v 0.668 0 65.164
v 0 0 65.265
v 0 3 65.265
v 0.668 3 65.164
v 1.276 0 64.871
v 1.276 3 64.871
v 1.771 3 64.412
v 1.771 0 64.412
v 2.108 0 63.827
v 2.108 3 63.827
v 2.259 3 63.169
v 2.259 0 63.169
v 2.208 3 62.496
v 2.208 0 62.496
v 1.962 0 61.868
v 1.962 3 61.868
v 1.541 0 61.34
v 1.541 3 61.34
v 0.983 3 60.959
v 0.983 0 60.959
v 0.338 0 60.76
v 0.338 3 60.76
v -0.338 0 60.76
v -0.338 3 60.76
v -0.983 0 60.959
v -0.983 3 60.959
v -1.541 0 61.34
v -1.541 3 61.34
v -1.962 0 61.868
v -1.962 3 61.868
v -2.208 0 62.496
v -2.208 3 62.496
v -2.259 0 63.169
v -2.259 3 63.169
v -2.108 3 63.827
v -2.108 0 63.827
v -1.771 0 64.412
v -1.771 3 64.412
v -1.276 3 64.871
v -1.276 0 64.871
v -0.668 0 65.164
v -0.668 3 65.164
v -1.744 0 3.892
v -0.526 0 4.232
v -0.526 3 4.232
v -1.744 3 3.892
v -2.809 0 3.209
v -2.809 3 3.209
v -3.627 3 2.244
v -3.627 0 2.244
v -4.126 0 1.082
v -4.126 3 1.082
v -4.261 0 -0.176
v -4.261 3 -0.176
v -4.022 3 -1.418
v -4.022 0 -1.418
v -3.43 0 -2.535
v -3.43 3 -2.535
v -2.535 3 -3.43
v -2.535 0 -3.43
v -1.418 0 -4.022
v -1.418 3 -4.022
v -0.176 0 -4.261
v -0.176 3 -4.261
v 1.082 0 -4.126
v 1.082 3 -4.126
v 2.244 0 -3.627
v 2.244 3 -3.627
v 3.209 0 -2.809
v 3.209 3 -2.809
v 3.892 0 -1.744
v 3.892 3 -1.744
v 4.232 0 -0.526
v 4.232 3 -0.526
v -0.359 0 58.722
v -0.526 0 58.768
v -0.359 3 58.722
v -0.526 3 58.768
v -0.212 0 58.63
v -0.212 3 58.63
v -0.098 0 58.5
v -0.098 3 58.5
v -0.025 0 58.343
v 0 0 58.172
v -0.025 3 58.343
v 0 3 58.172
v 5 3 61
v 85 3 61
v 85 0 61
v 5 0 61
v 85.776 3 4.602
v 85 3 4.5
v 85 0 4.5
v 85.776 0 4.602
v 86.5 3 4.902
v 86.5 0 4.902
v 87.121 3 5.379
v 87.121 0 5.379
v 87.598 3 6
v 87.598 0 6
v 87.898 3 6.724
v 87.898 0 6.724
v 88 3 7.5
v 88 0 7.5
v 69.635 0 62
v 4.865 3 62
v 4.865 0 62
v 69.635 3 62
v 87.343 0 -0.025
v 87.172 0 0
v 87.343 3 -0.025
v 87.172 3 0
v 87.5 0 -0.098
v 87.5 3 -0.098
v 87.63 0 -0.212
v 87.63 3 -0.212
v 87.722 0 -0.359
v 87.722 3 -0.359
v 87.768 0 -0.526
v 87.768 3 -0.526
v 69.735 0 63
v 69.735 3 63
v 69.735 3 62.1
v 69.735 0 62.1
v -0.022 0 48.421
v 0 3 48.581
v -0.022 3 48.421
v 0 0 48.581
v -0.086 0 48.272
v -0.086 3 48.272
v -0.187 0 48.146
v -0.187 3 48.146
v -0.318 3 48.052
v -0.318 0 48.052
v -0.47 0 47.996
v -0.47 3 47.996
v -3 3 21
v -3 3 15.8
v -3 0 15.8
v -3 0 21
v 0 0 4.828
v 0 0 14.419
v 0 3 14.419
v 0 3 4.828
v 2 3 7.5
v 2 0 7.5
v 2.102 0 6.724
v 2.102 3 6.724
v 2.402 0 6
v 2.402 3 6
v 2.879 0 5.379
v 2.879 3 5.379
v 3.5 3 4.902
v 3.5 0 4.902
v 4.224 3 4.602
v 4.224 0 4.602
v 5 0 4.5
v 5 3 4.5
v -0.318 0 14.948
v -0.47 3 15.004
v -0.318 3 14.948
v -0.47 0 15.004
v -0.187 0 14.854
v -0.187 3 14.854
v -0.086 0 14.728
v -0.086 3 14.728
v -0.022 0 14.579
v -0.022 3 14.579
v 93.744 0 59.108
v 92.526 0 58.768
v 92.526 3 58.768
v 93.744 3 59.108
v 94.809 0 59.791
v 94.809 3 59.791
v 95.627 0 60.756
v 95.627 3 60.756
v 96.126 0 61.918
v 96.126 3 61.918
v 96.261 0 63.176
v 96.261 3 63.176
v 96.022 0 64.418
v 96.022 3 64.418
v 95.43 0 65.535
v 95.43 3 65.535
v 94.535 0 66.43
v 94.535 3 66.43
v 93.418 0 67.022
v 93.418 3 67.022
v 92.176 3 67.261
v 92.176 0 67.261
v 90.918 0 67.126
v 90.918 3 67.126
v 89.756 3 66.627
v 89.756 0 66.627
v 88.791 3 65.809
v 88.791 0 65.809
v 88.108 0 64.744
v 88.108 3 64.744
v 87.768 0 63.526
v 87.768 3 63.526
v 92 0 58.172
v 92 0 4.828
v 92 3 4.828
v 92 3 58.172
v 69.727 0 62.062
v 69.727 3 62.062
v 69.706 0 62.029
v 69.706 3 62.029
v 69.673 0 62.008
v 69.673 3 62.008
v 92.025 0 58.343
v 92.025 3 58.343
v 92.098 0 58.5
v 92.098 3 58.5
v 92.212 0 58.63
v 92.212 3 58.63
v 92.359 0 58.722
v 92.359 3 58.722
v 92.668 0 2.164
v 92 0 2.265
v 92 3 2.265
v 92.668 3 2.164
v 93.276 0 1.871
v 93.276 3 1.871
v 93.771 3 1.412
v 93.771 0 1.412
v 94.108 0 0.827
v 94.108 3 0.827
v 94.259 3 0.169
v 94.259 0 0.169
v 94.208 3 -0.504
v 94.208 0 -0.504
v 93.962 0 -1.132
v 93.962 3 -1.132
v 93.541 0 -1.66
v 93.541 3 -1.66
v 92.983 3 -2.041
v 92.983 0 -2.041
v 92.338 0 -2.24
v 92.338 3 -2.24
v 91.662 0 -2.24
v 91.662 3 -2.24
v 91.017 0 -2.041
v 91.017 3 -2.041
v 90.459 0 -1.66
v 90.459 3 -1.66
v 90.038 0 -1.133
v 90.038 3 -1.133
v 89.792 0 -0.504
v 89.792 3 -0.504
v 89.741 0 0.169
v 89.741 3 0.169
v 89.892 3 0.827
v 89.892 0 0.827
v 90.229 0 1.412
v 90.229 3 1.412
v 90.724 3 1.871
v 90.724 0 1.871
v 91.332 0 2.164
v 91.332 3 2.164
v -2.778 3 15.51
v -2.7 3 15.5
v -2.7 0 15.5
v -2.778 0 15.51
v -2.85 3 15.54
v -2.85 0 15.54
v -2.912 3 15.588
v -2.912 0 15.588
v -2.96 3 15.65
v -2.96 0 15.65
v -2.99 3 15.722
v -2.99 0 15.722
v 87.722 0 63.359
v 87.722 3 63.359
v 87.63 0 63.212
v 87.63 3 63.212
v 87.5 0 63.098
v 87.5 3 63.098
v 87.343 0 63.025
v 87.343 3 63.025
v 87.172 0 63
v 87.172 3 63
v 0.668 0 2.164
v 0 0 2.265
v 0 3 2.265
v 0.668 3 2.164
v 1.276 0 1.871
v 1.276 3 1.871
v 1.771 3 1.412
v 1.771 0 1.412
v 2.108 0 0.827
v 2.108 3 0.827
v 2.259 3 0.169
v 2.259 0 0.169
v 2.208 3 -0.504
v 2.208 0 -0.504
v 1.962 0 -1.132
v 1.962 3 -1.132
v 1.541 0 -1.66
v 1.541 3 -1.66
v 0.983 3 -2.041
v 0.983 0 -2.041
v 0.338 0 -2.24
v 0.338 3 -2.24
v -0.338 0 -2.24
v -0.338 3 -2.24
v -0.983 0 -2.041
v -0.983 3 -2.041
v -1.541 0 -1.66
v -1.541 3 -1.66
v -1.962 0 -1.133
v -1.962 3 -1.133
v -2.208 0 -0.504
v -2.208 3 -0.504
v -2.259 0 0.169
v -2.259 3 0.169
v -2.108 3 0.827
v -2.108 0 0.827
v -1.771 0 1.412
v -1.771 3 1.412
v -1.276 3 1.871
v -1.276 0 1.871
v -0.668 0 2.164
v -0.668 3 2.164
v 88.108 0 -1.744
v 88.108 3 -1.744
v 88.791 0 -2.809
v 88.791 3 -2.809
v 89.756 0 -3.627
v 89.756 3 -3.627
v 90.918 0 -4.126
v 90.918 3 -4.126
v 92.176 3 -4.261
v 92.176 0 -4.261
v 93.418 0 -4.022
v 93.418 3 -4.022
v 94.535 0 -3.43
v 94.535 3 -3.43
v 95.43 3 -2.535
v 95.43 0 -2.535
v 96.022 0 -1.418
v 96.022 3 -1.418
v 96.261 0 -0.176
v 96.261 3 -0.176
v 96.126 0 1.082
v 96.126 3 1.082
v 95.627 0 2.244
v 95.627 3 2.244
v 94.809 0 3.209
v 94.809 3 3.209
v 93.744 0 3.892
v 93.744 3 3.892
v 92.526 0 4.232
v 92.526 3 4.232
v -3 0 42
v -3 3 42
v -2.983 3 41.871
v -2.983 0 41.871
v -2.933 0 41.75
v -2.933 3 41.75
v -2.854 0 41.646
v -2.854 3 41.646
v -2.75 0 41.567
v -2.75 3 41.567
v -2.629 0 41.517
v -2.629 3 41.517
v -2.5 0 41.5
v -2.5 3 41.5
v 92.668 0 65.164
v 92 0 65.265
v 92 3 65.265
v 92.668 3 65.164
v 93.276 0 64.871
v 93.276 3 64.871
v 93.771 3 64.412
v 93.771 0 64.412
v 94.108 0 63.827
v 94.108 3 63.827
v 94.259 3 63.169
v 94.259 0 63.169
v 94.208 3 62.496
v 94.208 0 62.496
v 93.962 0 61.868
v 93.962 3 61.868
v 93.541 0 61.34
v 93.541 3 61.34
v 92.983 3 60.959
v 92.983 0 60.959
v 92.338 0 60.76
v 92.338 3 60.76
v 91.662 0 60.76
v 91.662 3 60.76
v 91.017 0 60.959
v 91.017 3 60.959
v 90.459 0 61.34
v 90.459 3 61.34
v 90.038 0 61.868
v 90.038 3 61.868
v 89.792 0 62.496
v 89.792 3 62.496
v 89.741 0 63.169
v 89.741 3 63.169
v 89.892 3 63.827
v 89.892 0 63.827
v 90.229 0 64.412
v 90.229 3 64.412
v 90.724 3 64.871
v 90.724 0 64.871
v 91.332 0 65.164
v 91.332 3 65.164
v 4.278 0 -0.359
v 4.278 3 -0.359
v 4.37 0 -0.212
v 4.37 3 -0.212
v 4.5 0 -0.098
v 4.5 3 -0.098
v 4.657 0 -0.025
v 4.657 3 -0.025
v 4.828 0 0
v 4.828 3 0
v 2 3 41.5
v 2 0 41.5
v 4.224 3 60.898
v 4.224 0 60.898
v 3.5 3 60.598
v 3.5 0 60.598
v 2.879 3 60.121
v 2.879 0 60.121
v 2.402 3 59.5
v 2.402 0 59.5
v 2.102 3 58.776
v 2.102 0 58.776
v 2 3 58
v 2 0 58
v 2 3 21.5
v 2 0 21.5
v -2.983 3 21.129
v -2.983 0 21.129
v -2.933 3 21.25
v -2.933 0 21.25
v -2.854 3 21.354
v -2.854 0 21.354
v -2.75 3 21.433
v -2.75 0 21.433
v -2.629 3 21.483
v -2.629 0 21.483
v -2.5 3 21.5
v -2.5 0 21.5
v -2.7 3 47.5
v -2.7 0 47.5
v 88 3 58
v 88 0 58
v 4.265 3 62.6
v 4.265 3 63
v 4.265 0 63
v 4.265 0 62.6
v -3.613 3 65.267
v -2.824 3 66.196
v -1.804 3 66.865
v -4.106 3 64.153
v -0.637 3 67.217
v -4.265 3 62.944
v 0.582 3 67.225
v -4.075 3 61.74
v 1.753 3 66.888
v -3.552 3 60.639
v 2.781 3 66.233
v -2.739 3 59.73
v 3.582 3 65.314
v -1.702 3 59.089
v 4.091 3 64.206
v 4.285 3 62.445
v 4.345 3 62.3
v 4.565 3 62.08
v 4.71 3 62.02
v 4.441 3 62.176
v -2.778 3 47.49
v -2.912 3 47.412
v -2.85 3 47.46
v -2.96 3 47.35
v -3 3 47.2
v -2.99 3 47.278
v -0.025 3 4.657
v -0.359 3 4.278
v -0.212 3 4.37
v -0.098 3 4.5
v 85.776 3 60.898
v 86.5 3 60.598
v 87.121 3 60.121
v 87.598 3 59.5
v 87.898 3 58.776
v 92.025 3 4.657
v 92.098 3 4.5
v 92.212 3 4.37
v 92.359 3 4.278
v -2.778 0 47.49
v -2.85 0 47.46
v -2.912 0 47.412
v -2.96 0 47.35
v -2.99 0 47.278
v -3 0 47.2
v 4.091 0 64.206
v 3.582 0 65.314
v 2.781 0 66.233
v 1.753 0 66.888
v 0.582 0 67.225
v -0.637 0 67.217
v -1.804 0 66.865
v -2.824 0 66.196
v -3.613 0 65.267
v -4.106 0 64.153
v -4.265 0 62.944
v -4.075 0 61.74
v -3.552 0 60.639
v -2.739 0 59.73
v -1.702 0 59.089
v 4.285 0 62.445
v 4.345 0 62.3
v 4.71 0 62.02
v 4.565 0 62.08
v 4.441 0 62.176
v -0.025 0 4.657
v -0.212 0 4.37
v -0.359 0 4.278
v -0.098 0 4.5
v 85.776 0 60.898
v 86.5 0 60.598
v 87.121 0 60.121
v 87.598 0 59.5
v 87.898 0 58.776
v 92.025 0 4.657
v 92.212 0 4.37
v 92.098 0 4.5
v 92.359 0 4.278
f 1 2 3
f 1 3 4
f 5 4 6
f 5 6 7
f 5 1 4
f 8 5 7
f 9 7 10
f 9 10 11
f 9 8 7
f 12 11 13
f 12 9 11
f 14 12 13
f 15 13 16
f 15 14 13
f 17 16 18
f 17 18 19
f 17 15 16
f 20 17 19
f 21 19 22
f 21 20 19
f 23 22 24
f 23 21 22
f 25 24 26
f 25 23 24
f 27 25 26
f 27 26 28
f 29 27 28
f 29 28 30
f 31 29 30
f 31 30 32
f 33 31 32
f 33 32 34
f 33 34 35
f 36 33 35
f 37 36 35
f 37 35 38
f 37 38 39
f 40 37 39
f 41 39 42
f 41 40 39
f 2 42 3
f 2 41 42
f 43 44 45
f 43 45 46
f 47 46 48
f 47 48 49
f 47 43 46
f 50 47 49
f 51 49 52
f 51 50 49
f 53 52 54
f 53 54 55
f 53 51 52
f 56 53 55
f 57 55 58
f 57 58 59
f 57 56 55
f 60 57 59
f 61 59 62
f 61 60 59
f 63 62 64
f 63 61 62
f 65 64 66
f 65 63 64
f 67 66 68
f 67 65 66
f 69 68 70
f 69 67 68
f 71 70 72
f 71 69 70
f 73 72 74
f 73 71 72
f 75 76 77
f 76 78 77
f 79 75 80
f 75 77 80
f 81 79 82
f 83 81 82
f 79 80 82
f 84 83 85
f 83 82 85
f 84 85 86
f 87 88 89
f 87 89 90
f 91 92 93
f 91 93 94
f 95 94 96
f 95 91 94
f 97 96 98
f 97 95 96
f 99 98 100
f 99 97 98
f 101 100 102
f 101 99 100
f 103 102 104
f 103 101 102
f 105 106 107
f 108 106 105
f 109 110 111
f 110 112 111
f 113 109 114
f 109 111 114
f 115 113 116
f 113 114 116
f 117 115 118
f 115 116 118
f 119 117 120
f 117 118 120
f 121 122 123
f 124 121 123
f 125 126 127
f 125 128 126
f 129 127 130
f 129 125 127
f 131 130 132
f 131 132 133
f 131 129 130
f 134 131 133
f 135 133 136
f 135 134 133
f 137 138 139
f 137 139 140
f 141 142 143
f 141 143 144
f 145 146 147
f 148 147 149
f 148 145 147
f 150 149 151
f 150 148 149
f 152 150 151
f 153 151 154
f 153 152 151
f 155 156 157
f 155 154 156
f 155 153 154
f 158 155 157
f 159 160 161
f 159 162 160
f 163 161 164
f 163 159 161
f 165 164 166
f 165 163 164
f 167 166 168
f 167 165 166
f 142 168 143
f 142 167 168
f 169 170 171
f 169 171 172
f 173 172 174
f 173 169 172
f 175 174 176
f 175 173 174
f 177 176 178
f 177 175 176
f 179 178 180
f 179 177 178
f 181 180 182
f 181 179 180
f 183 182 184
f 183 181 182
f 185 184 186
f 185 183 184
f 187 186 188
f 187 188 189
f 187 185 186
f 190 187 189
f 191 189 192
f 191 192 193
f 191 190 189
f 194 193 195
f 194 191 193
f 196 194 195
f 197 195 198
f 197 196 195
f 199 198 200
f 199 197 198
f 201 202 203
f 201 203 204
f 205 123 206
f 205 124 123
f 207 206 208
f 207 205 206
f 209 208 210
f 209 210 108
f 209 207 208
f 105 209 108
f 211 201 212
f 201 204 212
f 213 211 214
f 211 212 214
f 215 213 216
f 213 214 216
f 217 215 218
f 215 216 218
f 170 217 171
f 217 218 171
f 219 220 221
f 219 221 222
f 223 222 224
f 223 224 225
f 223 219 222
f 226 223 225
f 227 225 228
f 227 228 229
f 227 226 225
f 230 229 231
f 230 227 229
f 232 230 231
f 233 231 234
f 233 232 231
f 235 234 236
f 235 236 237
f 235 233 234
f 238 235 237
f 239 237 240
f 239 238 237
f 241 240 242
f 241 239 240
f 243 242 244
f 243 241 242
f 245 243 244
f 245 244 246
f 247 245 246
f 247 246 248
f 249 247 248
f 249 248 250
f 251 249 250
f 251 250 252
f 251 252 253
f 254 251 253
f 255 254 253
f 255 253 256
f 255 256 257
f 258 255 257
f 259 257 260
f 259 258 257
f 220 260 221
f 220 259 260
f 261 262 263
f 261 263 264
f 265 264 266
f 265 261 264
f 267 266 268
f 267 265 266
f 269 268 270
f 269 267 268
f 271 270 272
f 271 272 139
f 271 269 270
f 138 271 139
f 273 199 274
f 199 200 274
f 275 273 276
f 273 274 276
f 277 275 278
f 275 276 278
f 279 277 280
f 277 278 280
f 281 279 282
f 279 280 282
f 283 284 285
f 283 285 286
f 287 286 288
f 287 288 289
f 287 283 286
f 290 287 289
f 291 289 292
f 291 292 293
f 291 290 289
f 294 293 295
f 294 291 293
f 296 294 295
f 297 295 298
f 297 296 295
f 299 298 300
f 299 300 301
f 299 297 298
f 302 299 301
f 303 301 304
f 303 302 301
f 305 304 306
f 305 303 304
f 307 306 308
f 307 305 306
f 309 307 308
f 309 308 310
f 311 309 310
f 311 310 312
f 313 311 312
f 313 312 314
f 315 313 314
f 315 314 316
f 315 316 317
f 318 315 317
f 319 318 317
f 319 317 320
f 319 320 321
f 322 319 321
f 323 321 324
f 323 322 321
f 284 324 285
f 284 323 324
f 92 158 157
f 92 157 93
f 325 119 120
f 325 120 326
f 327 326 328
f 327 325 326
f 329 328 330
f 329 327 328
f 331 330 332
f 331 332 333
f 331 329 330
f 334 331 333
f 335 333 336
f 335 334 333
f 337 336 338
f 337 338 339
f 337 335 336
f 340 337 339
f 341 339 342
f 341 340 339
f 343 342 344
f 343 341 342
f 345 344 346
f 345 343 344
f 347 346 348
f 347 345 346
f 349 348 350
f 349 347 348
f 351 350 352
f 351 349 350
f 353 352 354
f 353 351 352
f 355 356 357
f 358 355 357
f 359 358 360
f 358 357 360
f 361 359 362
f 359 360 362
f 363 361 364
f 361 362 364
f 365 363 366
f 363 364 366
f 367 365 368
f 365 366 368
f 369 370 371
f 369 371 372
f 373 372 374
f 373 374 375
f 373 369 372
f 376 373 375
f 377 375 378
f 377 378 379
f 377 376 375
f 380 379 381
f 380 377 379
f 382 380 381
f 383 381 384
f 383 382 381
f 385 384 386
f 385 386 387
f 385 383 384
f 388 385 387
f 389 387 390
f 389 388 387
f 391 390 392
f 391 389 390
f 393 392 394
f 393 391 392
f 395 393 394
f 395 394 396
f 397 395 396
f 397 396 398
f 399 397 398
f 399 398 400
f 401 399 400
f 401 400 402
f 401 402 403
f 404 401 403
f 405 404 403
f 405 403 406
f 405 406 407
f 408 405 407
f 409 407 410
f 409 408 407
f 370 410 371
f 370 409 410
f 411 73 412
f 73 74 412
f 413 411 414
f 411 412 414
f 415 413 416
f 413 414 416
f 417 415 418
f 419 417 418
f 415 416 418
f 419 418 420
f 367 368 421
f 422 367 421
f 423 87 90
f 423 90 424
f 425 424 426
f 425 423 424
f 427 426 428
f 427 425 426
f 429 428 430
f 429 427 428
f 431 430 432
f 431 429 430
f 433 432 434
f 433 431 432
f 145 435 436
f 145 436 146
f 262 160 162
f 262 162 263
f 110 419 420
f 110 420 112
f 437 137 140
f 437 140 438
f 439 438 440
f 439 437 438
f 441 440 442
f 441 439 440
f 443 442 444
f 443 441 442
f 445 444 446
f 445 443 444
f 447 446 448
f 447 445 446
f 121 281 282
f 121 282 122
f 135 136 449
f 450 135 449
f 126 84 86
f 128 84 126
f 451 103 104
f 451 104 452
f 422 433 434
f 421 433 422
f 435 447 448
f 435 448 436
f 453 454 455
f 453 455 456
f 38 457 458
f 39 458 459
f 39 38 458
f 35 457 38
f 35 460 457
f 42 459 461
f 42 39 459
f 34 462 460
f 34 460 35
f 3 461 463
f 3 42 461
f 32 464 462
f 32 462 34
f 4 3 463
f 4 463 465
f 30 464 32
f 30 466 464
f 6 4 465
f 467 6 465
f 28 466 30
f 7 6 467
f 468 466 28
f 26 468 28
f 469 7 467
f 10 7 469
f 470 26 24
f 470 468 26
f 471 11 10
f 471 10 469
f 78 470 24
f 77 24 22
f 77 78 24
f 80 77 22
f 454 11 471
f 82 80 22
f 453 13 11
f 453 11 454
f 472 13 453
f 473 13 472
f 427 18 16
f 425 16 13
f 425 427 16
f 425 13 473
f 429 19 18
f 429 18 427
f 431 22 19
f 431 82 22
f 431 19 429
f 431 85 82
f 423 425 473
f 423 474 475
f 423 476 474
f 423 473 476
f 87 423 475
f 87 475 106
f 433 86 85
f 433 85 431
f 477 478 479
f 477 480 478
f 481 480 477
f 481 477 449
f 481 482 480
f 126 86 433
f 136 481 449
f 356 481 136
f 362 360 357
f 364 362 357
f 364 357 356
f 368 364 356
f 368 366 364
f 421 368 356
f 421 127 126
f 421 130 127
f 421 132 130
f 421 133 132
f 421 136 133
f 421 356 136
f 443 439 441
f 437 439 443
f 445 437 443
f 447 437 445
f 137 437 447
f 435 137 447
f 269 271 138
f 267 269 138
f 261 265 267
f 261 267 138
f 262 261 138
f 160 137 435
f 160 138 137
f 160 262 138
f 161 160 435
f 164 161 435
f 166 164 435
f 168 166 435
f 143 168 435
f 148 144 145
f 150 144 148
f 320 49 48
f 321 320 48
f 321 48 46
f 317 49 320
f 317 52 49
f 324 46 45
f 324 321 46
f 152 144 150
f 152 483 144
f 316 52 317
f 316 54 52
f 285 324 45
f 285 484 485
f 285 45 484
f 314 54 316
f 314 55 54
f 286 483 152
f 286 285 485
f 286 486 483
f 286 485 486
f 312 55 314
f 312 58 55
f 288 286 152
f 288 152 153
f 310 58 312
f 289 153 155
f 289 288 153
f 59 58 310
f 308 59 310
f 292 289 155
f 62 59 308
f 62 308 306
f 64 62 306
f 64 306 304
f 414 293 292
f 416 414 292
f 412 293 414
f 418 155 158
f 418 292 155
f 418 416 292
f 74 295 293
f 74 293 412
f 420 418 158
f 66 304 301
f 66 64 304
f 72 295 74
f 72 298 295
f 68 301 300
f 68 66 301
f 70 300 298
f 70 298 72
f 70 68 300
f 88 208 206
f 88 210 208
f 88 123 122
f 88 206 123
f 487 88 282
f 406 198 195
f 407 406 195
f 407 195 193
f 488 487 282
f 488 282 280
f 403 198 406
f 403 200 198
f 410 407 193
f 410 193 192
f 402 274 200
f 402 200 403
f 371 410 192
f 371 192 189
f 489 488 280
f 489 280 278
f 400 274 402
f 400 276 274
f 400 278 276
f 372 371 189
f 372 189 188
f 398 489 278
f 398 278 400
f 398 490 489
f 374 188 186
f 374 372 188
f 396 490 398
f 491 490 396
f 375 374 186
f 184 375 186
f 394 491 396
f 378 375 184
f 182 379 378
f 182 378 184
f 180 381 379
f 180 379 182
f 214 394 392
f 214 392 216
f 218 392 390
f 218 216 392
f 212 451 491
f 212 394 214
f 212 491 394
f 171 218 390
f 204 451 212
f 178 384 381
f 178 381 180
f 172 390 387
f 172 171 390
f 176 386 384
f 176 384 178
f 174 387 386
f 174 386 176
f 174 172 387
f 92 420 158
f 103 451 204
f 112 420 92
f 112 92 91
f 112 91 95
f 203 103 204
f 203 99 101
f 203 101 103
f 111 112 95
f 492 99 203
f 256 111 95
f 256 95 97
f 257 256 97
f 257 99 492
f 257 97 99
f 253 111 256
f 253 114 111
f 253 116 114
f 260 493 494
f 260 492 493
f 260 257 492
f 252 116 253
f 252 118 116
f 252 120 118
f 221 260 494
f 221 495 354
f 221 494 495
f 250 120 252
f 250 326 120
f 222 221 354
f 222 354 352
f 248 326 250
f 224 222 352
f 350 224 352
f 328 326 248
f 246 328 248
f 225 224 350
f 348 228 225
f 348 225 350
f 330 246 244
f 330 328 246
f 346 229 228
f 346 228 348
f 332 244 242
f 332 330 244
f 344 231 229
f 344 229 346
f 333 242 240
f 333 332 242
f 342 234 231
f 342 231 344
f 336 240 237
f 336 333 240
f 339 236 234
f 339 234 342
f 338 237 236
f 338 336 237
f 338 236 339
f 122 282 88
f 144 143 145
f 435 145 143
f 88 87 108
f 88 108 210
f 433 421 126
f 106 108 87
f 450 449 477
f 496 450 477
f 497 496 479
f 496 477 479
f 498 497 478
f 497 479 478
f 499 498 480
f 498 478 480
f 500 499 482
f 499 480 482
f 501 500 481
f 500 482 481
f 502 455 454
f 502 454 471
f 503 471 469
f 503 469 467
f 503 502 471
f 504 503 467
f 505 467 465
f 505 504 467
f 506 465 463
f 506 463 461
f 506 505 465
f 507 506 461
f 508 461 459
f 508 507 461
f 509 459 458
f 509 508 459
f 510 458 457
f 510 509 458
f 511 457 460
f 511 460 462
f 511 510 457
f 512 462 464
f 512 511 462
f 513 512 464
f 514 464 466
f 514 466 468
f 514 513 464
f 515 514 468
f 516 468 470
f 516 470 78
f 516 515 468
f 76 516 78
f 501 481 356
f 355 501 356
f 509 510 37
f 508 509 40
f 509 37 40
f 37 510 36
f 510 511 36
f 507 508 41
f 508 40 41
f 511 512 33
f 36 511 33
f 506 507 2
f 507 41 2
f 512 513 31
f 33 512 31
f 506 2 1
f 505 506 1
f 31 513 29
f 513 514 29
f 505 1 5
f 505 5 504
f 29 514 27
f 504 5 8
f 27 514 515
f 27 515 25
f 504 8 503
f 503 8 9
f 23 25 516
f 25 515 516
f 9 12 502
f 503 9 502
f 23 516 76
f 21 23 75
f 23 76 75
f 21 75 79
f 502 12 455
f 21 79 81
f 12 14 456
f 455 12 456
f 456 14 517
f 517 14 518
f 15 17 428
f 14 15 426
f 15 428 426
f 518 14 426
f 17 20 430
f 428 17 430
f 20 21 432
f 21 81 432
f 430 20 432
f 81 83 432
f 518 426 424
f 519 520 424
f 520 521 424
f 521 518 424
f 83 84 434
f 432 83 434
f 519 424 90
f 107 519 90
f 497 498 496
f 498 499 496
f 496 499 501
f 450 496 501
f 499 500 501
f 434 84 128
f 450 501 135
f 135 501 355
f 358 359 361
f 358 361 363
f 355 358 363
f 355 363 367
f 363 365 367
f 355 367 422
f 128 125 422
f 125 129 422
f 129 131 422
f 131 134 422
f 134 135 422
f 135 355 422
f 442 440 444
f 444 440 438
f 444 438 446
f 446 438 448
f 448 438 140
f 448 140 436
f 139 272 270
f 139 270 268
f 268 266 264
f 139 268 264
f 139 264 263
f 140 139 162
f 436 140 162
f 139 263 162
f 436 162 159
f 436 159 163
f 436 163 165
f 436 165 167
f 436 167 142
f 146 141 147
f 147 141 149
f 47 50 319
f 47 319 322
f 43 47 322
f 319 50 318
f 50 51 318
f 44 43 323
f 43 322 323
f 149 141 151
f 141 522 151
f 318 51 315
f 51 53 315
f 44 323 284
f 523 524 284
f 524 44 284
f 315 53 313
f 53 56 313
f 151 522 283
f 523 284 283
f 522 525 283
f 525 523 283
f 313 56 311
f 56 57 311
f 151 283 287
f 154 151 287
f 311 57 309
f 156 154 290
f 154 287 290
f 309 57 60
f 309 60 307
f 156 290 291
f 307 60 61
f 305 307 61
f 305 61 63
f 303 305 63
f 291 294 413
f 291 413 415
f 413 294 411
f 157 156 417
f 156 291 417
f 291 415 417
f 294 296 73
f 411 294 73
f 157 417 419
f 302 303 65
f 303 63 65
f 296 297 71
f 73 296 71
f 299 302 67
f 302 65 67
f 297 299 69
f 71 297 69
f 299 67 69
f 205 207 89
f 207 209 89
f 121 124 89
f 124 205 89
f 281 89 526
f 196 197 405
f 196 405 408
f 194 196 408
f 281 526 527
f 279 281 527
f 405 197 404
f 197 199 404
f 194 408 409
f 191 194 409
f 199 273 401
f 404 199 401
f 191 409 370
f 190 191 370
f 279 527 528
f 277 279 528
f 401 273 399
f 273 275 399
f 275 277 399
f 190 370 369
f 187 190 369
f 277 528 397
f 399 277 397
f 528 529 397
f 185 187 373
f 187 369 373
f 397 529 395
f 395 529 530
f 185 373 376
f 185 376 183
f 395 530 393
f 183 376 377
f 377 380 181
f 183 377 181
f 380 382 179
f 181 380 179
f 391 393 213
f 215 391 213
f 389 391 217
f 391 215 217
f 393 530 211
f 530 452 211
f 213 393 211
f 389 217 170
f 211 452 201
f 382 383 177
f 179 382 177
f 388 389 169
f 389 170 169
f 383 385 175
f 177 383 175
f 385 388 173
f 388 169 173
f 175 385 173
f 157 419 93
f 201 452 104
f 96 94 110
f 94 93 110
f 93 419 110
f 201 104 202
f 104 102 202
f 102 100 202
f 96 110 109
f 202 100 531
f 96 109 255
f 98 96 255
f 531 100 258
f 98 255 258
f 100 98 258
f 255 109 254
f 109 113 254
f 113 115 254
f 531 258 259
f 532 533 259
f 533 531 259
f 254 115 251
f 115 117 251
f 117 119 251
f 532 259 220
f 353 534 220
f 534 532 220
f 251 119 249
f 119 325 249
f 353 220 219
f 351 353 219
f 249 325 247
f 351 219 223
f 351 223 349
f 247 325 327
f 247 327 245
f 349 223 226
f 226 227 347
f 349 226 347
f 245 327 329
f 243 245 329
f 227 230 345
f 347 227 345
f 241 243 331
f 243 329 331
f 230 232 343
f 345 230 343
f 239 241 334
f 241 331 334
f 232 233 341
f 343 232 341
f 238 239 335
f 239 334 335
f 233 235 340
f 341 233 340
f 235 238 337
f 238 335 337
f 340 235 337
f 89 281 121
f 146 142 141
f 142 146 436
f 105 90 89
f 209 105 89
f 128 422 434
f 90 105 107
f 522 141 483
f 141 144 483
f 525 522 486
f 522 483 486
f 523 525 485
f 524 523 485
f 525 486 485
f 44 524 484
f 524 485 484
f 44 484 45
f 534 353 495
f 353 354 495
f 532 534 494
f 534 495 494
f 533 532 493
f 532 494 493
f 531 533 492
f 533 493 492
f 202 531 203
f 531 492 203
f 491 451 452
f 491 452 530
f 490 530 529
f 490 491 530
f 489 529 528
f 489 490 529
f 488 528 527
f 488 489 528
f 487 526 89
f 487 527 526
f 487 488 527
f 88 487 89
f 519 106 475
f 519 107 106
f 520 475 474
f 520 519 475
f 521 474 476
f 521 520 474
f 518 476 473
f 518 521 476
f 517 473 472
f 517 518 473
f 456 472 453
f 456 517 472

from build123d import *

# Parameters (mm, degrees)
SKETCH1_R           = 2.265
BOSS_EXTRUDE1_DEPTH = 3
SKETCH2_W           = 6.5
SKETCH2_H           = 20
CUT_EXTRUDE1_DEPTH  = 3
BOSS_EXTRUDE2_DEPTH = 3
CUT_EXTRUDE5_DEPTH  = 17
SKETCH9_W           = 65.47
SKETCH9_H           = 1
CUT_EXTRUDE6_DEPTH  = 17
FILLET2_R           = 0.6
FILLET3_R           = 0.1


with BuildPart() as part:
    # Sketch1 → Boss-Extrude1 (new body)
    with BuildSketch(Plane(origin=(0, 0, 0), x_dir=(1, 0, 0), z_dir=(0, 1, 0))):
        with BuildLine():
            Line((4.265, 0), (87.735, 0))
            ThreePointArc((87.735, 0), (95.015810422, 3.015810422), (92, -4.265))
            Line((92, -4.265), (92, -58.735))
            ThreePointArc((92, -58.735), (95.015810422, -66.015810422), (87.735, -63))
            Line((87.735, -63), (4.265, -63))
            ThreePointArc((4.265, -63), (-3.015810422, -66.015810422), (0, -58.735))
            Line((0, -58.735), (0, -4.265))
            ThreePointArc((0, -4.265), (-3.015810422, 3.015810422), (4.265, 0))
        make_face()
        with Locations(Location((0, 0, 0), (0, 0, 270))):
            Circle(SKETCH1_R, mode=Mode.SUBTRACT)
        with Locations(Location((92, 0, 0), (0, 0, 270))):
            Circle(SKETCH1_R, mode=Mode.SUBTRACT)
        with Locations(Location((92, -63, 0), (0, 0, 270))):
            Circle(SKETCH1_R, mode=Mode.SUBTRACT)
        with Locations(Location((0, -63, 0), (0, 0, 270))):
            Circle(SKETCH1_R, mode=Mode.SUBTRACT)
    extrude(amount=BOSS_EXTRUDE1_DEPTH)

    # Sketch2 → Cut-Extrude1 (cut)
    with BuildSketch(Plane(origin=(0, 3, 0), x_dir=(1, 0, 0), z_dir=(0, 1, 0))):
        with Locations((3.25, -31.5)):
            Rectangle(SKETCH2_W, SKETCH2_H)
    extrude(amount=-CUT_EXTRUDE1_DEPTH, mode=Mode.SUBTRACT)

    # Sketch3 → Boss-Extrude2 (add)
    with BuildSketch(Plane(origin=(0, 3, 0), x_dir=(1, 0, 0), z_dir=(0, 1, 0))):
        with BuildLine():
            Line((0, -14.9), (-2.7, -15.5))
            ThreePointArc((-2.7, -15.5), (-2.912132034, -15.587867966), (-3, -15.8))
            Line((-3, -15.8), (-3, -21))
            ThreePointArc((-3, -21), (-2.853553391, -21.353553391), (-2.5, -21.5))
            Line((-2.5, -21.5), (0, -21.5))
            Line((0, -21.5), (0, -14.9))
        make_face()
        with BuildLine():
            Line((0, -41.5), (0, -48.1))
            Line((0, -48.1), (-2.7, -47.5))
            ThreePointArc((-2.7, -47.5), (-2.912132034, -47.412132034), (-3, -47.2))
            Line((-3, -47.2), (-3, -42))
            ThreePointArc((-3, -42), (-2.853553391, -41.646446609), (-2.5, -41.5))
            Line((-2.5, -41.5), (0, -41.5))
        make_face()
    extrude(amount=-BOSS_EXTRUDE2_DEPTH)

    # Sketch8 → Cut-Extrude5 (cut)
    with BuildSketch(Plane(origin=(0, 3, 0), x_dir=(1, 0, 0), z_dir=(0, 1, 0))):
        with BuildLine():
            Line((5, -4.5), (85, -4.5))
            ThreePointArc((85, -4.5), (87.121320344, -5.378679656), (88, -7.5))
            Line((88, -7.5), (88, -58))
            ThreePointArc((88, -58), (87.121320344, -60.121320344), (85, -61))
            Line((85, -61), (5, -61))
            ThreePointArc((5, -61), (2.878679656, -60.121320344), (2, -58))
            Line((2, -58), (2, -7.5))
            ThreePointArc((2, -7.5), (2.878679656, -5.378679656), (5, -4.5))
        make_face()
    extrude(amount=-CUT_EXTRUDE5_DEPTH, mode=Mode.SUBTRACT)

    # Sketch9 → Cut-Extrude6 (cut)
    with BuildSketch(Plane(origin=(0, 3, 0), x_dir=(1, 0, 0), z_dir=(0, 1, 0))):
        with Locations((37, -62.5)):
            Rectangle(SKETCH9_W, SKETCH9_H)
    extrude(amount=-CUT_EXTRUDE6_DEPTH, mode=Mode.SUBTRACT)

    # Fillet2
    fillet2_edges = [part.edges().sort_by_distance(p)[0] for p in [
        (92, 1.5, 4.265),
        (92, 1.5, 58.735),
        (4.265, 1.5, 62),
        (87.735, 1.5, 63),
        (0, 1.5, 58.735),
        (0, 1.5, 4.265),
        (4.265, 1.5, 0),
        (87.735, 1.5, 0),
        (0, 1.5, 14.9),
        (0, 1.5, 48.1),
    ]]
    fillet(fillet2_edges, radius=FILLET2_R)

    # Fillet3
    fillet3_edges = [part.edges().sort_by_distance(p)[0] for p in [
        (69.735, 1.5, 62),
    ]]
    fillet(fillet3_edges, radius=FILLET3_R)


solid = part.part
